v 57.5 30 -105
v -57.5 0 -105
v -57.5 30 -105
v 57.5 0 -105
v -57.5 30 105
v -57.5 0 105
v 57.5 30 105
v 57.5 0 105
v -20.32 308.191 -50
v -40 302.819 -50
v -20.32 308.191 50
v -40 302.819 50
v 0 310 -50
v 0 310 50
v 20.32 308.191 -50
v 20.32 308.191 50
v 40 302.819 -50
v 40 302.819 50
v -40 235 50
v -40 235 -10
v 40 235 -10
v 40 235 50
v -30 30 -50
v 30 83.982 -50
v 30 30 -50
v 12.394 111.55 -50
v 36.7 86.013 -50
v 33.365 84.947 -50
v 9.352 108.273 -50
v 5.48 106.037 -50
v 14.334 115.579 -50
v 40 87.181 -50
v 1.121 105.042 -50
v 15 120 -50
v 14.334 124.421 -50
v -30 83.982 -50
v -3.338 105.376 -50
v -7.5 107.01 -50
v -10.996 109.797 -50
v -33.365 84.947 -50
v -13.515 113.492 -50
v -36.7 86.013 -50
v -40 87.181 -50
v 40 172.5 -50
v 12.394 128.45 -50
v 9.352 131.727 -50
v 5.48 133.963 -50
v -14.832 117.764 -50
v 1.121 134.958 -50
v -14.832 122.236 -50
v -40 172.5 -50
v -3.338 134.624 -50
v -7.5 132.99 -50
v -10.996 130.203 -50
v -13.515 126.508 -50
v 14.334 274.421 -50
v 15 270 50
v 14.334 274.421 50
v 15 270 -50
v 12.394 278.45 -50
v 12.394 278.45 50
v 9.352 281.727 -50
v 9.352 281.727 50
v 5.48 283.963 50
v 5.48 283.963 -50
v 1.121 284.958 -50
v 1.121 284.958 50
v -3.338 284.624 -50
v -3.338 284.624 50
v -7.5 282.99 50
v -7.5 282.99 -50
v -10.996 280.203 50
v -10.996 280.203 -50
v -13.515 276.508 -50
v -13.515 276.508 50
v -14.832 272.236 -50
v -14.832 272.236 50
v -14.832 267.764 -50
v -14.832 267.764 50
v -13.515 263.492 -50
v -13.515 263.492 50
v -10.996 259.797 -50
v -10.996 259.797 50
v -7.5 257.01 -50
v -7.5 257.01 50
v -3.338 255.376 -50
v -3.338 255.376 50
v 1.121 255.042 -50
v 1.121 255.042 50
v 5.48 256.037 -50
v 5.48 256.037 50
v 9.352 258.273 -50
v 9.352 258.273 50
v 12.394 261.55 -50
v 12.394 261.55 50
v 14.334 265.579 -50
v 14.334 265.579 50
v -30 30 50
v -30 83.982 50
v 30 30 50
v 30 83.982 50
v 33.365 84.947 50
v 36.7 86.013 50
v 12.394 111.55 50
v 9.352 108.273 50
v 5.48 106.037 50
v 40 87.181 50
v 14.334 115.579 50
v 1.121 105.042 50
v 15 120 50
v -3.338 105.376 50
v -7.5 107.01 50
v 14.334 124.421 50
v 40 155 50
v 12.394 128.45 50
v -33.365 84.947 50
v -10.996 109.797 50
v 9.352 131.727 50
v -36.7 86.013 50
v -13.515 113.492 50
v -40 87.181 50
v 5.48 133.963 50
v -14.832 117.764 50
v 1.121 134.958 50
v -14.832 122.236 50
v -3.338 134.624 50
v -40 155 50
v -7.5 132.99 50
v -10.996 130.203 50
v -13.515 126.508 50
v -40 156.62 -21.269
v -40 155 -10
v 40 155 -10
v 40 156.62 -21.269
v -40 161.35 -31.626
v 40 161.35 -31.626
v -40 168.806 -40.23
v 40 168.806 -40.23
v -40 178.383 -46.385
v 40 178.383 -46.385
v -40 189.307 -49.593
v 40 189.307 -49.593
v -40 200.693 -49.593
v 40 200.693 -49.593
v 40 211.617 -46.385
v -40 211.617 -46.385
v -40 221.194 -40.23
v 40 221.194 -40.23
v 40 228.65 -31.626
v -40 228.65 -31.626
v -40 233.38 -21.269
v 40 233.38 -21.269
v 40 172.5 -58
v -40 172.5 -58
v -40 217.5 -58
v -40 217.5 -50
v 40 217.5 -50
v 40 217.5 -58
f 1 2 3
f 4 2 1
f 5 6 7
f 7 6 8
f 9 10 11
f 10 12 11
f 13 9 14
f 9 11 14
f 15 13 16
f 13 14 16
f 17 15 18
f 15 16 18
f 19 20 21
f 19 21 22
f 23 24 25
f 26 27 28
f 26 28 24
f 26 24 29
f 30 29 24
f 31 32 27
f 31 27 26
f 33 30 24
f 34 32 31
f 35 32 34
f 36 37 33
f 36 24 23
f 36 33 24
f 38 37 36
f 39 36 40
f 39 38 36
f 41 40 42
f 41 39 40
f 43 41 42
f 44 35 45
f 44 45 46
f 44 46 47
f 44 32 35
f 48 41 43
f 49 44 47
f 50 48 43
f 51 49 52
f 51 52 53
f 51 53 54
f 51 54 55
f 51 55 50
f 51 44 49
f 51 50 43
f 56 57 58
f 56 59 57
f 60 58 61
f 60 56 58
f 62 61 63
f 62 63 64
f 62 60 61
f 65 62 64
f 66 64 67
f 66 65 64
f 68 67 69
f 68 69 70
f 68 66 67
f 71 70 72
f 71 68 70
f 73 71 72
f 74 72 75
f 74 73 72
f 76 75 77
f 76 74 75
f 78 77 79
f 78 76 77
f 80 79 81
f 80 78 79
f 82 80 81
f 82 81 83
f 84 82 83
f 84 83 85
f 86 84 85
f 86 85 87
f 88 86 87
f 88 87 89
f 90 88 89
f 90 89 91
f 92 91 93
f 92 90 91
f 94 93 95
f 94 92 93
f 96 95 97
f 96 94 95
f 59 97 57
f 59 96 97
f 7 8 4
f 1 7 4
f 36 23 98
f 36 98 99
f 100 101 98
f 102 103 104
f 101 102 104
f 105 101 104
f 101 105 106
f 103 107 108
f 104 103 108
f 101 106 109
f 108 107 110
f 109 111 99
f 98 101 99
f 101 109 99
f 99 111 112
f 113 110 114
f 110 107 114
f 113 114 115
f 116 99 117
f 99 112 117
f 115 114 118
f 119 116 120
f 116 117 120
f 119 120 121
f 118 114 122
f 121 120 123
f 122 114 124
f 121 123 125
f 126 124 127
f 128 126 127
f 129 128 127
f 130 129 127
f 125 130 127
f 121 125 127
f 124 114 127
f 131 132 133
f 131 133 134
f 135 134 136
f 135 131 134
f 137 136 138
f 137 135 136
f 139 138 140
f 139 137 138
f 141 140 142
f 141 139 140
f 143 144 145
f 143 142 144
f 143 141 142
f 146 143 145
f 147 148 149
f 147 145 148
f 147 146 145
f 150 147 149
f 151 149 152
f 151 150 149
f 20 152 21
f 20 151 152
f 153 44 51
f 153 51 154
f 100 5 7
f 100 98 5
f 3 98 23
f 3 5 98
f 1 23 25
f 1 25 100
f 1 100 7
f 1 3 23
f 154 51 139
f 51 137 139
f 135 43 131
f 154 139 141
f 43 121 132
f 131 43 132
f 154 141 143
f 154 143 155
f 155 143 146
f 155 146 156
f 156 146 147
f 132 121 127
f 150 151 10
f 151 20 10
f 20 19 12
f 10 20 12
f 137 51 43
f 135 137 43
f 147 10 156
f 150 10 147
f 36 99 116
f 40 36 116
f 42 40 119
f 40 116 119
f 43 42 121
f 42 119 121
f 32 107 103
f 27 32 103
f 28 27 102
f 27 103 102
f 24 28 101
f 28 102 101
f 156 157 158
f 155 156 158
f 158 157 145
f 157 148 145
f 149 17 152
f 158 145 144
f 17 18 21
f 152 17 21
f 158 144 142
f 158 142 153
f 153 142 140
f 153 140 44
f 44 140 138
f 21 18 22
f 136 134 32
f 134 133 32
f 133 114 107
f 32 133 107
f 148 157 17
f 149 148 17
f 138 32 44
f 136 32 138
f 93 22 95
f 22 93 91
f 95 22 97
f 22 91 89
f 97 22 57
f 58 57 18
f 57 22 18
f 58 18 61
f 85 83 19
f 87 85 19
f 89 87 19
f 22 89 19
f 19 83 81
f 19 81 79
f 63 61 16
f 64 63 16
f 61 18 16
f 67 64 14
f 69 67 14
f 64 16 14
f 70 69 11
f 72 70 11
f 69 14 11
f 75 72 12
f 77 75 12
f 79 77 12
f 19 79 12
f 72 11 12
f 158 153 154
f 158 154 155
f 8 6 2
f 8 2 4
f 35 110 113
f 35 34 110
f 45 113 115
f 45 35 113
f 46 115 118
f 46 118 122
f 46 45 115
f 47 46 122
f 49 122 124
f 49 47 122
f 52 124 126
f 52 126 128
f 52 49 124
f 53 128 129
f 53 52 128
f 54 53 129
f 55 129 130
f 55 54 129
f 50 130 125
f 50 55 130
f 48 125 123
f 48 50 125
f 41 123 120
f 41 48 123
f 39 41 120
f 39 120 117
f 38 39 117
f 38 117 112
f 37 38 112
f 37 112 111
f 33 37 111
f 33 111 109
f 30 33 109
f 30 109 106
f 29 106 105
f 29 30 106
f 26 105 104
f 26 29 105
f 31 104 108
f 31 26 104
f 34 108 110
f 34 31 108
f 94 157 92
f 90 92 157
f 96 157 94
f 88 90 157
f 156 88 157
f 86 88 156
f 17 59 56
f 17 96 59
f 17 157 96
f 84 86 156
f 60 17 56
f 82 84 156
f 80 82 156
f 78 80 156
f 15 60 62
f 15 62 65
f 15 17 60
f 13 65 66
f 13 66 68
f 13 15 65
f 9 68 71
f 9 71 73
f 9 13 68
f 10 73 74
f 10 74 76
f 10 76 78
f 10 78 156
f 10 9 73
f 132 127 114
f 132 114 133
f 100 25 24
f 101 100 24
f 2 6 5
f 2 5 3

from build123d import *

# Parameters (mm, degrees)
SKETCH1_W           = 115
SKETCH1_H           = 210
BOSS_EXTRUDE1_DEPTH = 30
SKETCH2_W           = 60
SKETCH2_H           = 60
BOSS_EXTRUDE3_DEPTH = 50
SKETCH3_R           = 15
BOSS_EXTRUDE4_DEPTH = 50
SKETCH8_W           = 8
SKETCH8_H           = 45
BOSS_EXTRUDE7_DEPTH = 80
CUT_EXTRUDE1_DEPTH  = 180


with BuildPart() as part:
    # Sketch1 → Boss-Extrude1 (new body)
    with BuildSketch(Plane(origin=(0, 0, 0), x_dir=(1, 0, 0), z_dir=(0, 1, 0))):
        Rectangle(SKETCH1_W, SKETCH1_H)
    extrude(amount=BOSS_EXTRUDE1_DEPTH)

    # Sketch2 → Boss-Extrude3 (add, symmetric)
    with BuildSketch(Plane.XY):
        with Locations((0, 60)):
            Rectangle(SKETCH2_W, SKETCH2_H)
    extrude(amount=BOSS_EXTRUDE3_DEPTH, both=True)

    # Sketch3 → Boss-Extrude4 (add, symmetric)
    with BuildSketch(Plane.XY):
        with BuildLine():
            Line((-40, 87.180706736), (-40, 302.819293264))
            ThreePointArc((-40, 302.819293264), (0, 310), (40, 302.819293264))
            Line((40, 302.819293264), (40, 87.180706736))
            ThreePointArc((40, 87.180706736), (0, 80), (-40, 87.180706736))
        make_face()
        with Locations((0, 270)):
            Circle(SKETCH3_R, mode=Mode.SUBTRACT)
        with Locations((0, 120)):
            Circle(SKETCH3_R, mode=Mode.SUBTRACT)
    extrude(amount=BOSS_EXTRUDE4_DEPTH, both=True)

    # Sketch8 → Boss-Extrude7 (add)
    with BuildSketch(Plane(origin=(40, 0, 0), x_dir=(0, 0, -1), z_dir=(1, 0, 0))):
        with Locations((54, 195)):
            Rectangle(SKETCH8_W, SKETCH8_H)
    extrude(amount=-BOSS_EXTRUDE7_DEPTH)

    # Sketch7 → Cut-Extrude1 (cut)
    with BuildSketch(Plane.ZY.offset(40)):
        with BuildLine():
            Line((-10, 235), (50, 235))
            Line((50, 235), (50, 155))
            Line((50, 155), (-10, 155))
            ThreePointArc((-10, 155), (-50, 195), (-10, 235))
        make_face()
    extrude(amount=-CUT_EXTRUDE1_DEPTH, mode=Mode.SUBTRACT)


solid = part.part
